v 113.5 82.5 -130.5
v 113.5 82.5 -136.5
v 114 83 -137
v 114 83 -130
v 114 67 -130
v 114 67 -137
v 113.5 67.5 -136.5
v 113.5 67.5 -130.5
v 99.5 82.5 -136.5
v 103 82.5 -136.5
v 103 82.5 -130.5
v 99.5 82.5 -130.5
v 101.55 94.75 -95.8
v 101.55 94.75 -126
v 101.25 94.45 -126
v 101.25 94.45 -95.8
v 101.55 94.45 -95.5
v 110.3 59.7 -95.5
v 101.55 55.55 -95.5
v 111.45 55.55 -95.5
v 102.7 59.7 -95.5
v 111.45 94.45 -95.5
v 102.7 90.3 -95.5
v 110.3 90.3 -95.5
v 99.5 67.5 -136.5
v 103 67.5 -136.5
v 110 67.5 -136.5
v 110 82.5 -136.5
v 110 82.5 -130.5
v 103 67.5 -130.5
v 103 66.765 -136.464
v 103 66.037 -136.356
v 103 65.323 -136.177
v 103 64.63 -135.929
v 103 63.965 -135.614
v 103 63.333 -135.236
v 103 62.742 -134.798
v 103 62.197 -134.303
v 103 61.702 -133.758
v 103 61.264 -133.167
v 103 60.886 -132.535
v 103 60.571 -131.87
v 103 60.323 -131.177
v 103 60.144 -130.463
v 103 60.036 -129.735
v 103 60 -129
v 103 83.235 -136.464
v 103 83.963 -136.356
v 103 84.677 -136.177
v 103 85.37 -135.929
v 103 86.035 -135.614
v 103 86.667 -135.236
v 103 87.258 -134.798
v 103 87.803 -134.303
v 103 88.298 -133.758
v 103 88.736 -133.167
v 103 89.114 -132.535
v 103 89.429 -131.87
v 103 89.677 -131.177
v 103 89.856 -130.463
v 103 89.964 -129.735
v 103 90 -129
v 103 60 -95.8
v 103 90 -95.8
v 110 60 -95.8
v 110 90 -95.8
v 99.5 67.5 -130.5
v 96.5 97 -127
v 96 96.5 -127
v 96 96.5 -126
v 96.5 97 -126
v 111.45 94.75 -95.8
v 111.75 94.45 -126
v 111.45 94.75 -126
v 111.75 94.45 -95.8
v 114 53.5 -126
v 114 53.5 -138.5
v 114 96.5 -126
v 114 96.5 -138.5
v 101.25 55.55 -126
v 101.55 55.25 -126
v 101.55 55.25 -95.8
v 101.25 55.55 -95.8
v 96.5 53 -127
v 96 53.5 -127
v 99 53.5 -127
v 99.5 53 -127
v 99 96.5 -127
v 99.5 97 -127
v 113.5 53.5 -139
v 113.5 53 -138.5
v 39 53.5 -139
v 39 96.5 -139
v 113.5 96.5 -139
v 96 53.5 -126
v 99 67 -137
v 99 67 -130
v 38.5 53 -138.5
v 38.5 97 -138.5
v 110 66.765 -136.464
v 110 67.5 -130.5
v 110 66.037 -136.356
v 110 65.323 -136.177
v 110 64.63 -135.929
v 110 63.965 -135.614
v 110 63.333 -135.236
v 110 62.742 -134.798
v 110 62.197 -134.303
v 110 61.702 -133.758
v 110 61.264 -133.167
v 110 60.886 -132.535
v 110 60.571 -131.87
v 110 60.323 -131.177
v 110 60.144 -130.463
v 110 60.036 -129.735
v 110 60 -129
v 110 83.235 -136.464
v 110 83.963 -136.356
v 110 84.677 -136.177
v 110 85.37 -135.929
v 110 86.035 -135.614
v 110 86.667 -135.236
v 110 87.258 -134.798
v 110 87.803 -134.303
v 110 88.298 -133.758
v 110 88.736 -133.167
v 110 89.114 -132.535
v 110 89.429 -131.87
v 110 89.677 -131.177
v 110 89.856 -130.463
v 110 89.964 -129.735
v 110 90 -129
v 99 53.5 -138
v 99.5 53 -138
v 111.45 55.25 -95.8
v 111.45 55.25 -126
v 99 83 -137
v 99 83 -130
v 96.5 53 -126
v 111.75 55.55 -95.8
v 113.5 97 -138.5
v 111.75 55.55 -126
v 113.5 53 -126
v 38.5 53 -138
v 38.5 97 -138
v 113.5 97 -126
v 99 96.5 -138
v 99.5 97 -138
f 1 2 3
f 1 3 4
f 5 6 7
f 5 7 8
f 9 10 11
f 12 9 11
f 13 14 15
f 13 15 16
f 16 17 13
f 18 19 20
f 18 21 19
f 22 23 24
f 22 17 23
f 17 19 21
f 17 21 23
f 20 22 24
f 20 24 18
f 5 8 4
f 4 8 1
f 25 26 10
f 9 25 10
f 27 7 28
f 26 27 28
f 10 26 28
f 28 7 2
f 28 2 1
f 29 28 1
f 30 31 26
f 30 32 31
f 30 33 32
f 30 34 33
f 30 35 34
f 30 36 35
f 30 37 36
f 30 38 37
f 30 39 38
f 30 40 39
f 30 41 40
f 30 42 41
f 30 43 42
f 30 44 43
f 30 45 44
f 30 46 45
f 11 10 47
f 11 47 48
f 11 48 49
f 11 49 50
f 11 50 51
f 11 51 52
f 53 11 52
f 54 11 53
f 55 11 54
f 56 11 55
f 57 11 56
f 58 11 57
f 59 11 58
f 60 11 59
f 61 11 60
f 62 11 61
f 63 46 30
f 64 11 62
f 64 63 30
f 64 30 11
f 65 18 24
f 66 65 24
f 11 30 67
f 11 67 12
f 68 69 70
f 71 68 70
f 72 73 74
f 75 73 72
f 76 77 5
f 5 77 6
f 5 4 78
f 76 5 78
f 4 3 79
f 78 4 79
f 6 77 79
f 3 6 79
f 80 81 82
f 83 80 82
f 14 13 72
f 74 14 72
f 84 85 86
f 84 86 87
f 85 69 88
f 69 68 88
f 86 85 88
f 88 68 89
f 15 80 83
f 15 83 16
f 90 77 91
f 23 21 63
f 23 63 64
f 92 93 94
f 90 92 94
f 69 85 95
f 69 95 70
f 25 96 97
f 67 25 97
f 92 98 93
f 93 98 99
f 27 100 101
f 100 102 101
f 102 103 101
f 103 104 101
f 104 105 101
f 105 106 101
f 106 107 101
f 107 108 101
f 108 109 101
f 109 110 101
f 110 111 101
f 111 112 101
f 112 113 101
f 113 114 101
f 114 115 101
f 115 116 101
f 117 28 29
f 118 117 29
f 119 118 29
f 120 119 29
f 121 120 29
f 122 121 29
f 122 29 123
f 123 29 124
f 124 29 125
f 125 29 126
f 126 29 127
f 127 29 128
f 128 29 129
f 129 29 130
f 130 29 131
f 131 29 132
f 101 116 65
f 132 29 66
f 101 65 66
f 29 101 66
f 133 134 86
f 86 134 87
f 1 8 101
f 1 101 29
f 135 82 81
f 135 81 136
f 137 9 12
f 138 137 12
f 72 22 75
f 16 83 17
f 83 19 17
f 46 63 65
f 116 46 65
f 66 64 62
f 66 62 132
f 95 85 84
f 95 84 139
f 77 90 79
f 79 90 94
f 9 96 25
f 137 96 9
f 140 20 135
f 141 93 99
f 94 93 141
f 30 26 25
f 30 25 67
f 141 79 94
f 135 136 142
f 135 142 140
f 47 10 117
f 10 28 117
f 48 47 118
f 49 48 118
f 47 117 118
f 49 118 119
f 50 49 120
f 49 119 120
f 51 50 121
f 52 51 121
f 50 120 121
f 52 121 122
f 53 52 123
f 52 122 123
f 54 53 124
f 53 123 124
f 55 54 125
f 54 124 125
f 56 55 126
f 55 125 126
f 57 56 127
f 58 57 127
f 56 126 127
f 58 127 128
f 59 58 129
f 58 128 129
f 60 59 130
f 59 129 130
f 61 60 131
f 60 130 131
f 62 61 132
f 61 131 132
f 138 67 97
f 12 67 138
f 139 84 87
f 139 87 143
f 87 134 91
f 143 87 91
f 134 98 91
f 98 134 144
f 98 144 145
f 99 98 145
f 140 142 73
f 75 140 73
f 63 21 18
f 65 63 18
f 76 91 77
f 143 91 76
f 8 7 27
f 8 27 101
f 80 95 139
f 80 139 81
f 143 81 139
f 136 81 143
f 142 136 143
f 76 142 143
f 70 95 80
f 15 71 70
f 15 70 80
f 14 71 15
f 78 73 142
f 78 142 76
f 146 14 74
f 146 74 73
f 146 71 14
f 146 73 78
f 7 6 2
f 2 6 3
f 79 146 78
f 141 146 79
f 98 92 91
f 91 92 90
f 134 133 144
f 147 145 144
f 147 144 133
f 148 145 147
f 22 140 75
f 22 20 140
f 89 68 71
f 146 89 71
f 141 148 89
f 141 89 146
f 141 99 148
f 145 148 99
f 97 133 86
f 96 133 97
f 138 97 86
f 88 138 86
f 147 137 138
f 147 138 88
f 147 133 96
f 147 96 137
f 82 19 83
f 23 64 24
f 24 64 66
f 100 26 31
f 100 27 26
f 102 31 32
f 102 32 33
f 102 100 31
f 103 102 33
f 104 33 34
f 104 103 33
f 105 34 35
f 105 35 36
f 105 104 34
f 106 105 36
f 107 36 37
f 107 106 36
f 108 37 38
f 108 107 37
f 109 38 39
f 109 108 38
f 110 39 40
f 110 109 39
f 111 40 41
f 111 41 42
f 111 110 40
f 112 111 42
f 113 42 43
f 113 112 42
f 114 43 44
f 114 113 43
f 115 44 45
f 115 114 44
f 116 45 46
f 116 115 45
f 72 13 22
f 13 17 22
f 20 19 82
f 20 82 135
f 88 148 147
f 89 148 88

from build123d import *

# Parameters (mm, degrees)
SKETCH080_W     = 75.5
SKETCH080_H     = 44
PAD043_DEPTH    = 1
SKETCH081_W     = 15
SKETCH081_H     = 44
PAD044_DEPTH    = 11
SKETCH082_W     = 18
SKETCH082_H     = 44
PAD045_DEPTH    = 1
SKETCH083_W     = 10.5
SKETCH083_H     = 39.5
PAD046_DEPTH    = 30.5
SKETCH084_W     = 7
SKETCH084_H     = 30
POCKET029_DEPTH = 41
SKETCH085_W     = 15
SKETCH085_H     = 6
POCKET030_DEPTH = 15
FILLET012_R     = 7.5
CHAMFER047_SIZE = 0.5
CHAMFER048_SIZE = 0.3


with BuildPart() as part:
    # Sketch080 → Pad043 (new body)
    with BuildSketch(Plane.XY):
        with Locations((-30.25, 0)):
            Rectangle(SKETCH080_W, SKETCH080_H)
    extrude(amount=-PAD043_DEPTH)

    # Sketch081 (on Face5 of Pad043) → Pad044 (join)
    with BuildSketch(Plane.XY):
        Rectangle(SKETCH081_W, SKETCH081_H)
    extrude(amount=PAD044_DEPTH)

    # Sketch082 (on Face5 of Pad044) → Pad045 (join)
    with BuildSketch(Plane.XY.offset(11)):
        with Locations((-1.5, 0)):
            Rectangle(SKETCH082_W, SKETCH082_H)
    extrude(amount=PAD045_DEPTH)

    # Sketch083 (on Face7 of Pad045) → Pad046 (join)
    with BuildSketch(Plane.XY.offset(12)):
        Rectangle(SKETCH083_W, SKETCH083_H)
    extrude(amount=PAD046_DEPTH)

    # Sketch084 (on Face15 of Pad046) → Pocket029 (cut)
    with BuildSketch(Plane.XY.offset(42.5)):
        Rectangle(SKETCH084_W, SKETCH084_H)
    extrude(amount=-POCKET029_DEPTH, mode=Mode.SUBTRACT)

    # Sketch085 (on Face6 of Pocket029) → Pocket030 (cut)
    with BuildSketch(Plane.YZ.offset(7.5)):
        with Locations((0, 4.5)):
            Rectangle(SKETCH085_W, SKETCH085_H)
    extrude(amount=-POCKET030_DEPTH, mode=Mode.SUBTRACT)

    # Fillet012
    fillet012_edges = [part.edges().sort_by_distance(p)[0] for p in [
        (0, -15, 1.5),
        (0, 15, 1.5),
    ]]
    fillet(fillet012_edges, radius=FILLET012_R)

    # Chamfer047
    chamfer047_edges = [part.edges().sort_by_distance(p)[0] for p in [
        (7.5, -22, 5.5),
        (7.5, 22, 5.5),
        (7.5, 0, 7.5),
        (7.5, -7.5, 4.5),
        (7.5, 0, 1.5),
        (7.5, 7.5, 4.5),
        (7.5, 0, -1),
        (-30.25, -22, -1),
        (-7.5, -22, 5.5),
        (-10.5, -22, 11.5),
        (-68, 0, -1),
        (-30.25, 22, -1),
        (-7.5, 22, 5.5),
        (-10.5, 22, 11.5),
        (-7.5, 0, 7.5),
        (-7.5, -7.5, 4.5),
        (-7.5, 0, 1.5),
        (-7.5, 7.5, 4.5),
    ]]
    chamfer(chamfer047_edges, length=CHAMFER047_SIZE)

    # Chamfer048
    chamfer048_edges = [part.edges().sort_by_distance(p)[0] for p in [
        (0, 19.75, 42.5),
        (-5.25, 0, 42.5),
        (5.25, 0, 42.5),
        (0, -19.75, 42.5),
        (-3.5, 0, 42.5),
        (0, -15, 42.5),
        (3.5, 0, 42.5),
        (0, 15, 42.5),
        (-5.25, -19.75, 27.25),
        (5.25, -19.75, 27.25),
        (-5.25, 19.75, 27.25),
        (5.25, 19.75, 27.25),
    ]]
    chamfer(chamfer048_edges, length=CHAMFER048_SIZE)


with BuildPart() as part_1:
    # Body015 placement: moved
    add(part.part.moved(Location((106.5, 75, -138))))


solid = part_1.part
